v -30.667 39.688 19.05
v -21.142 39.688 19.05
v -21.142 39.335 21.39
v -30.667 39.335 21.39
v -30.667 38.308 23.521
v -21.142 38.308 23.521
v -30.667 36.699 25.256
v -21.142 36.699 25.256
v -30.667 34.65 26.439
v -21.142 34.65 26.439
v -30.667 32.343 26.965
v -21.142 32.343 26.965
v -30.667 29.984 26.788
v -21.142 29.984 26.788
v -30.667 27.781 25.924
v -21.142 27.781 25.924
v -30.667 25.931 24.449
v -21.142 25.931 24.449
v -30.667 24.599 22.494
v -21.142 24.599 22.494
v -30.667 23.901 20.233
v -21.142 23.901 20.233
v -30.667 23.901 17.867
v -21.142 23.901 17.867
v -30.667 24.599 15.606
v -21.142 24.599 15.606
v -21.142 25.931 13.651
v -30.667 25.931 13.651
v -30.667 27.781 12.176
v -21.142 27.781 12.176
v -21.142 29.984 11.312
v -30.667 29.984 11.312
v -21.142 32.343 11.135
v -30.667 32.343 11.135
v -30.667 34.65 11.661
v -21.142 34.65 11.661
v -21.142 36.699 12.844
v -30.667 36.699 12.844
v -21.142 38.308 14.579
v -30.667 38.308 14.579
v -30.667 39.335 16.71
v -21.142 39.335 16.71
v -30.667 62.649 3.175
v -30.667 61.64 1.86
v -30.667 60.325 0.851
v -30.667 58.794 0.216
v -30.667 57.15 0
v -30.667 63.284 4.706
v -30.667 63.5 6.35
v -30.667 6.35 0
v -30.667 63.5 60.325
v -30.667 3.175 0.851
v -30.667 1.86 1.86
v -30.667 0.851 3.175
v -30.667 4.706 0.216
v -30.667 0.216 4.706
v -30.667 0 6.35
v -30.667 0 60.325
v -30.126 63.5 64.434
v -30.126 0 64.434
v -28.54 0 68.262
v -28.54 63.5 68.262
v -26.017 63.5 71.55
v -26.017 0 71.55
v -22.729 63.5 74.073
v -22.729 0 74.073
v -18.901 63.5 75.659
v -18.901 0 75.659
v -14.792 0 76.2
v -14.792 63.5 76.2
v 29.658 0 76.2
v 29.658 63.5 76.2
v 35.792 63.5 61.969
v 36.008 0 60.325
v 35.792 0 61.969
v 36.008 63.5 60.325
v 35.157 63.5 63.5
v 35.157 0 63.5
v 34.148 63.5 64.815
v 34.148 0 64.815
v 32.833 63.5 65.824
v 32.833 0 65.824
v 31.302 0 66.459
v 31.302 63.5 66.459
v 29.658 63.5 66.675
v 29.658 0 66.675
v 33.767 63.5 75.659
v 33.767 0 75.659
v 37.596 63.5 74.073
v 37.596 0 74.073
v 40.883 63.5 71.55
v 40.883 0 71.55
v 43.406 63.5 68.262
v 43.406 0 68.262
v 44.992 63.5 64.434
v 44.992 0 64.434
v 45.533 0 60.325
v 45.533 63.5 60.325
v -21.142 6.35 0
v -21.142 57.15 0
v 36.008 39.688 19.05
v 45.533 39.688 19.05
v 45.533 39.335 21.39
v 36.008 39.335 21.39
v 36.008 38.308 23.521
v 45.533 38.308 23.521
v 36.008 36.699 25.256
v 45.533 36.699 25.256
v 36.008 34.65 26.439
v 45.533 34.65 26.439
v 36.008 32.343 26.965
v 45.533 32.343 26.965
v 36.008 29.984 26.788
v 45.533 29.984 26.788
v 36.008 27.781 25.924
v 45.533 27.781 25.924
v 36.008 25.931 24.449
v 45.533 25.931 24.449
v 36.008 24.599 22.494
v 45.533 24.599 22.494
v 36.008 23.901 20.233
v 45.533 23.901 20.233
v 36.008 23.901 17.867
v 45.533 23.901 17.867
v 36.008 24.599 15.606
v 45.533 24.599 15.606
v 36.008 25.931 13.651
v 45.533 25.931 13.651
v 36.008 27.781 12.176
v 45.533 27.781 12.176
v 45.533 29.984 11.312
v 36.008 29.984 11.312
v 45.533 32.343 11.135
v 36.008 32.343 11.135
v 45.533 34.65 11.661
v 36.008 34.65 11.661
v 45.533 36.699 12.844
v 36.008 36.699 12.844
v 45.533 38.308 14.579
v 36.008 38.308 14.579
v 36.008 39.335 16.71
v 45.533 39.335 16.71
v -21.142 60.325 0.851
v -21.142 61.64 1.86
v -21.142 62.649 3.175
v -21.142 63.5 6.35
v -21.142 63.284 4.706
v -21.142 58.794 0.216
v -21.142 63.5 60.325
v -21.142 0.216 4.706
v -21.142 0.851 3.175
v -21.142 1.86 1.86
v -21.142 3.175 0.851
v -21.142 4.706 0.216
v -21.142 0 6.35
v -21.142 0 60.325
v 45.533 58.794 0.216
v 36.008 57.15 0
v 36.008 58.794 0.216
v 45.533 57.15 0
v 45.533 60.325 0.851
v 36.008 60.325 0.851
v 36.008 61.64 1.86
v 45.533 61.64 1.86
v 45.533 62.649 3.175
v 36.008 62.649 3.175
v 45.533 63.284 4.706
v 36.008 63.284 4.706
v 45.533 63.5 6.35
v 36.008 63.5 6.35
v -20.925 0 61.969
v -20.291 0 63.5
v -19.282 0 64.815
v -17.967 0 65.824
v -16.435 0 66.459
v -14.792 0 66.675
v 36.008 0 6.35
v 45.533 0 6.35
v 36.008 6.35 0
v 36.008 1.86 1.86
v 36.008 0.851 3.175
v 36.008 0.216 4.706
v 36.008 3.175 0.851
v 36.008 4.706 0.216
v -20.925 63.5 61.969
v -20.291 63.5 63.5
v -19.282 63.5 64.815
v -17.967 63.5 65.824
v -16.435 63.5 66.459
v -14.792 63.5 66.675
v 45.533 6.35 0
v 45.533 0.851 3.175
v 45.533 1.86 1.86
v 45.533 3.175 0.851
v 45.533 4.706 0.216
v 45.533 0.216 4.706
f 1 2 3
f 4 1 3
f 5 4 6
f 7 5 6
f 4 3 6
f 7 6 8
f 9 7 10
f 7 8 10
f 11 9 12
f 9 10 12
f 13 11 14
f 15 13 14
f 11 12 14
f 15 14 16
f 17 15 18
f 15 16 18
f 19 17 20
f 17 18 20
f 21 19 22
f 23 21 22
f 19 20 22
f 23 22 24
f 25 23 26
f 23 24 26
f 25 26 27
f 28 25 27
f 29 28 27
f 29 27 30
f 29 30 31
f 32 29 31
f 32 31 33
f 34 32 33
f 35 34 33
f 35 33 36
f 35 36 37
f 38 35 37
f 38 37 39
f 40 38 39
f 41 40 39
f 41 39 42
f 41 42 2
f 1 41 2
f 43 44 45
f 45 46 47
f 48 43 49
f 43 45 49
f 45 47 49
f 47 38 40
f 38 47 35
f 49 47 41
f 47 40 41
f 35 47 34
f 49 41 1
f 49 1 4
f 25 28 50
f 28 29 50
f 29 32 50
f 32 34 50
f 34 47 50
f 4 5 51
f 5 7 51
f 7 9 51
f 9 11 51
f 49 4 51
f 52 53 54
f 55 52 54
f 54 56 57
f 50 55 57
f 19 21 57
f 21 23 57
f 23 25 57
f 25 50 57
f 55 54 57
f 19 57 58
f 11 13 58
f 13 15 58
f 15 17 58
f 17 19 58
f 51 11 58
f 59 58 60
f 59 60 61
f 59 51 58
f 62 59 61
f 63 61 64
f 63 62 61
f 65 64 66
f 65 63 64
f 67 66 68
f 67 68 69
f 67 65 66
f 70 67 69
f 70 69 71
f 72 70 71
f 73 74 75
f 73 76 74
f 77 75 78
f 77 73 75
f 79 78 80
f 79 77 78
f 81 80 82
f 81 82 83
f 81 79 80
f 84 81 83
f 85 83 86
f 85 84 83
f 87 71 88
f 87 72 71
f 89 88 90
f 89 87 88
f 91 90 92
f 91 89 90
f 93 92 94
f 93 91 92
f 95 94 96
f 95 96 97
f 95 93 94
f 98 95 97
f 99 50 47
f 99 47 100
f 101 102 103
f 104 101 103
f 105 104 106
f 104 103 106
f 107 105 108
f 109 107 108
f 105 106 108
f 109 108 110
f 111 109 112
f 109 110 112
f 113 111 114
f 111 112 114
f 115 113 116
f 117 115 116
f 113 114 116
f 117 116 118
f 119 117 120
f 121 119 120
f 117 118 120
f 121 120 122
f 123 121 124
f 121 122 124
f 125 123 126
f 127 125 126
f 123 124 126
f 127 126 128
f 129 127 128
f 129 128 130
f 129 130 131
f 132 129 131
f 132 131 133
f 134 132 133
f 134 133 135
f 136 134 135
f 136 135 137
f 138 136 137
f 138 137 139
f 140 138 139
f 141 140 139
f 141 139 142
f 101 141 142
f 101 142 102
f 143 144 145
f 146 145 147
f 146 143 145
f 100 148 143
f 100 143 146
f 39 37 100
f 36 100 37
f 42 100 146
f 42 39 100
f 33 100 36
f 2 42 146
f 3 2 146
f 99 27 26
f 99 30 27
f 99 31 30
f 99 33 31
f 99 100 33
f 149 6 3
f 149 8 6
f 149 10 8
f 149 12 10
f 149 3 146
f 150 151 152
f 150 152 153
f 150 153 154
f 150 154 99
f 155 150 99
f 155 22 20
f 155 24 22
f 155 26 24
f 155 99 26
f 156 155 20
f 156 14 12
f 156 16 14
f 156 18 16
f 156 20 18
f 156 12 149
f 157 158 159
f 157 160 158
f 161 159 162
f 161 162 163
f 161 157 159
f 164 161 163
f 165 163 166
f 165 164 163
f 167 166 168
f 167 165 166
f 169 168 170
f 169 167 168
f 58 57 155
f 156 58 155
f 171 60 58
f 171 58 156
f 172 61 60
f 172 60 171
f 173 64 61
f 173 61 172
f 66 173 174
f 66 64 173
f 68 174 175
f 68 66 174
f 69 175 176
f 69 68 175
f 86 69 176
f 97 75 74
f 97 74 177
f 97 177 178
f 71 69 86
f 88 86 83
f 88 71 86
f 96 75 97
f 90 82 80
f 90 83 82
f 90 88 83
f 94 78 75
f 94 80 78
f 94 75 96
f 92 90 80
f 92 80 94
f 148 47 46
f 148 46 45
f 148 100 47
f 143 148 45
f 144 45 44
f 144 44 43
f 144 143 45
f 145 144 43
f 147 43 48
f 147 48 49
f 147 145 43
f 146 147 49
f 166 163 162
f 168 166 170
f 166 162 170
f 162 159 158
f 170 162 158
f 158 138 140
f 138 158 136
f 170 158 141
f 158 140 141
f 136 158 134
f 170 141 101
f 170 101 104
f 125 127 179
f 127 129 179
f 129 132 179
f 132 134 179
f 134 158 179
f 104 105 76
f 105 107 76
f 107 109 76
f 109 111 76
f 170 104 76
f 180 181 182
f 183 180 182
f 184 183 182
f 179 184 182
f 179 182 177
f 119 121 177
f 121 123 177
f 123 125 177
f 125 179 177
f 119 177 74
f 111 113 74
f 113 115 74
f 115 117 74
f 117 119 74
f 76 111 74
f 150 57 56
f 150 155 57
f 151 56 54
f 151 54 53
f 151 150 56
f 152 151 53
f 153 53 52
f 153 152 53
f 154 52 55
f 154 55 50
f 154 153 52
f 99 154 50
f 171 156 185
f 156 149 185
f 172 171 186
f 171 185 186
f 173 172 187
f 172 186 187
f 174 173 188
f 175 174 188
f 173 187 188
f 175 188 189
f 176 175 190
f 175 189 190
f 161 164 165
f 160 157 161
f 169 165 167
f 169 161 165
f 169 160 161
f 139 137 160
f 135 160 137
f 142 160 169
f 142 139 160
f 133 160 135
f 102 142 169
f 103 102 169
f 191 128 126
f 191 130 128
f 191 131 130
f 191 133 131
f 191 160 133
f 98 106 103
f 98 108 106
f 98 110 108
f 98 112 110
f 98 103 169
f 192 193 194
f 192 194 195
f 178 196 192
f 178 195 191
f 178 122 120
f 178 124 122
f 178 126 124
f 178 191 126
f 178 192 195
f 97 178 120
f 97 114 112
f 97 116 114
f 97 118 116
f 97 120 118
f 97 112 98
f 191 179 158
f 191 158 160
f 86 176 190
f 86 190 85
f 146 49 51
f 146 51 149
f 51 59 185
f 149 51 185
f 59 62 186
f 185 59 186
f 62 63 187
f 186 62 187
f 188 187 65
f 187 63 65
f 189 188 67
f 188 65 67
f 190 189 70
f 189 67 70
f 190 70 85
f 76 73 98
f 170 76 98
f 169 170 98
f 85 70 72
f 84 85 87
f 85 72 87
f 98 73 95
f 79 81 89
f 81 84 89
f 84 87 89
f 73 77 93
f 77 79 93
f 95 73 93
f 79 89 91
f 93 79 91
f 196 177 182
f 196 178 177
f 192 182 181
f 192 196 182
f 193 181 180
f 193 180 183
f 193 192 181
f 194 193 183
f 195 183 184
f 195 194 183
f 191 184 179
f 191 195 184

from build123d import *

# Parameters (mm, degrees)
F0_W     = 76.2
F0_H     = 76.2
F1_DEPTH = 63.5
F2_T     = -9.525
F3_R     = 6.35
F4_R     = 15.875
F5_R     = 7.9375
F6_DEPTH = 76.201
F7_R     = 6.35


with BuildPart() as f1:
    # F0 (on Front) → F1 (new body)
    with BuildSketch(Plane.XZ):
        with Locations((7.4331681192, 38.1)):
            Rectangle(F0_W, F0_H)
    extrude(amount=-F1_DEPTH)

    # F2
    f2_openings = [f1.faces().sort_by_distance(p)[0] for p in [
        (7.433168, 0, 38.1),
        (7.433168, 31.75, 0),
        (7.433168, 63.5, 38.1),
    ]]
    offset(amount=F2_T, openings=f2_openings)

    # F3
    f3_edges = [f1.edges().sort_by_distance(p)[0] for p in [
        (-21.141832, 31.75, 66.675),
        (36.008168, 31.75, 66.675),
    ]]
    fillet(f3_edges, radius=F3_R)

    # F4
    f4_edges = [f1.edges().sort_by_distance(p)[0] for p in [
        (-30.666832, 31.75, 76.2),
        (45.533168, 31.75, 76.2),
    ]]
    fillet(f4_edges, radius=F4_R)

    # F5 (on face) → F6 (cut, through all)
    with BuildSketch(Plane.YZ.offset(45.5331681192)):
        with Locations((31.75, 19.05)):
            Circle(F5_R)
    extrude(amount=-F6_DEPTH, mode=Mode.SUBTRACT)

    # F7
    f7_edges = [f1.edges().sort_by_distance(p)[0] for p in [
        (-25.904332, 0, 0),
        (40.770668, 0, 0),
        (-25.904332, 63.5, 0),
        (40.770668, 63.5, 0),
    ]]
    fillet(f7_edges, radius=F7_R)


solid = f1.part
